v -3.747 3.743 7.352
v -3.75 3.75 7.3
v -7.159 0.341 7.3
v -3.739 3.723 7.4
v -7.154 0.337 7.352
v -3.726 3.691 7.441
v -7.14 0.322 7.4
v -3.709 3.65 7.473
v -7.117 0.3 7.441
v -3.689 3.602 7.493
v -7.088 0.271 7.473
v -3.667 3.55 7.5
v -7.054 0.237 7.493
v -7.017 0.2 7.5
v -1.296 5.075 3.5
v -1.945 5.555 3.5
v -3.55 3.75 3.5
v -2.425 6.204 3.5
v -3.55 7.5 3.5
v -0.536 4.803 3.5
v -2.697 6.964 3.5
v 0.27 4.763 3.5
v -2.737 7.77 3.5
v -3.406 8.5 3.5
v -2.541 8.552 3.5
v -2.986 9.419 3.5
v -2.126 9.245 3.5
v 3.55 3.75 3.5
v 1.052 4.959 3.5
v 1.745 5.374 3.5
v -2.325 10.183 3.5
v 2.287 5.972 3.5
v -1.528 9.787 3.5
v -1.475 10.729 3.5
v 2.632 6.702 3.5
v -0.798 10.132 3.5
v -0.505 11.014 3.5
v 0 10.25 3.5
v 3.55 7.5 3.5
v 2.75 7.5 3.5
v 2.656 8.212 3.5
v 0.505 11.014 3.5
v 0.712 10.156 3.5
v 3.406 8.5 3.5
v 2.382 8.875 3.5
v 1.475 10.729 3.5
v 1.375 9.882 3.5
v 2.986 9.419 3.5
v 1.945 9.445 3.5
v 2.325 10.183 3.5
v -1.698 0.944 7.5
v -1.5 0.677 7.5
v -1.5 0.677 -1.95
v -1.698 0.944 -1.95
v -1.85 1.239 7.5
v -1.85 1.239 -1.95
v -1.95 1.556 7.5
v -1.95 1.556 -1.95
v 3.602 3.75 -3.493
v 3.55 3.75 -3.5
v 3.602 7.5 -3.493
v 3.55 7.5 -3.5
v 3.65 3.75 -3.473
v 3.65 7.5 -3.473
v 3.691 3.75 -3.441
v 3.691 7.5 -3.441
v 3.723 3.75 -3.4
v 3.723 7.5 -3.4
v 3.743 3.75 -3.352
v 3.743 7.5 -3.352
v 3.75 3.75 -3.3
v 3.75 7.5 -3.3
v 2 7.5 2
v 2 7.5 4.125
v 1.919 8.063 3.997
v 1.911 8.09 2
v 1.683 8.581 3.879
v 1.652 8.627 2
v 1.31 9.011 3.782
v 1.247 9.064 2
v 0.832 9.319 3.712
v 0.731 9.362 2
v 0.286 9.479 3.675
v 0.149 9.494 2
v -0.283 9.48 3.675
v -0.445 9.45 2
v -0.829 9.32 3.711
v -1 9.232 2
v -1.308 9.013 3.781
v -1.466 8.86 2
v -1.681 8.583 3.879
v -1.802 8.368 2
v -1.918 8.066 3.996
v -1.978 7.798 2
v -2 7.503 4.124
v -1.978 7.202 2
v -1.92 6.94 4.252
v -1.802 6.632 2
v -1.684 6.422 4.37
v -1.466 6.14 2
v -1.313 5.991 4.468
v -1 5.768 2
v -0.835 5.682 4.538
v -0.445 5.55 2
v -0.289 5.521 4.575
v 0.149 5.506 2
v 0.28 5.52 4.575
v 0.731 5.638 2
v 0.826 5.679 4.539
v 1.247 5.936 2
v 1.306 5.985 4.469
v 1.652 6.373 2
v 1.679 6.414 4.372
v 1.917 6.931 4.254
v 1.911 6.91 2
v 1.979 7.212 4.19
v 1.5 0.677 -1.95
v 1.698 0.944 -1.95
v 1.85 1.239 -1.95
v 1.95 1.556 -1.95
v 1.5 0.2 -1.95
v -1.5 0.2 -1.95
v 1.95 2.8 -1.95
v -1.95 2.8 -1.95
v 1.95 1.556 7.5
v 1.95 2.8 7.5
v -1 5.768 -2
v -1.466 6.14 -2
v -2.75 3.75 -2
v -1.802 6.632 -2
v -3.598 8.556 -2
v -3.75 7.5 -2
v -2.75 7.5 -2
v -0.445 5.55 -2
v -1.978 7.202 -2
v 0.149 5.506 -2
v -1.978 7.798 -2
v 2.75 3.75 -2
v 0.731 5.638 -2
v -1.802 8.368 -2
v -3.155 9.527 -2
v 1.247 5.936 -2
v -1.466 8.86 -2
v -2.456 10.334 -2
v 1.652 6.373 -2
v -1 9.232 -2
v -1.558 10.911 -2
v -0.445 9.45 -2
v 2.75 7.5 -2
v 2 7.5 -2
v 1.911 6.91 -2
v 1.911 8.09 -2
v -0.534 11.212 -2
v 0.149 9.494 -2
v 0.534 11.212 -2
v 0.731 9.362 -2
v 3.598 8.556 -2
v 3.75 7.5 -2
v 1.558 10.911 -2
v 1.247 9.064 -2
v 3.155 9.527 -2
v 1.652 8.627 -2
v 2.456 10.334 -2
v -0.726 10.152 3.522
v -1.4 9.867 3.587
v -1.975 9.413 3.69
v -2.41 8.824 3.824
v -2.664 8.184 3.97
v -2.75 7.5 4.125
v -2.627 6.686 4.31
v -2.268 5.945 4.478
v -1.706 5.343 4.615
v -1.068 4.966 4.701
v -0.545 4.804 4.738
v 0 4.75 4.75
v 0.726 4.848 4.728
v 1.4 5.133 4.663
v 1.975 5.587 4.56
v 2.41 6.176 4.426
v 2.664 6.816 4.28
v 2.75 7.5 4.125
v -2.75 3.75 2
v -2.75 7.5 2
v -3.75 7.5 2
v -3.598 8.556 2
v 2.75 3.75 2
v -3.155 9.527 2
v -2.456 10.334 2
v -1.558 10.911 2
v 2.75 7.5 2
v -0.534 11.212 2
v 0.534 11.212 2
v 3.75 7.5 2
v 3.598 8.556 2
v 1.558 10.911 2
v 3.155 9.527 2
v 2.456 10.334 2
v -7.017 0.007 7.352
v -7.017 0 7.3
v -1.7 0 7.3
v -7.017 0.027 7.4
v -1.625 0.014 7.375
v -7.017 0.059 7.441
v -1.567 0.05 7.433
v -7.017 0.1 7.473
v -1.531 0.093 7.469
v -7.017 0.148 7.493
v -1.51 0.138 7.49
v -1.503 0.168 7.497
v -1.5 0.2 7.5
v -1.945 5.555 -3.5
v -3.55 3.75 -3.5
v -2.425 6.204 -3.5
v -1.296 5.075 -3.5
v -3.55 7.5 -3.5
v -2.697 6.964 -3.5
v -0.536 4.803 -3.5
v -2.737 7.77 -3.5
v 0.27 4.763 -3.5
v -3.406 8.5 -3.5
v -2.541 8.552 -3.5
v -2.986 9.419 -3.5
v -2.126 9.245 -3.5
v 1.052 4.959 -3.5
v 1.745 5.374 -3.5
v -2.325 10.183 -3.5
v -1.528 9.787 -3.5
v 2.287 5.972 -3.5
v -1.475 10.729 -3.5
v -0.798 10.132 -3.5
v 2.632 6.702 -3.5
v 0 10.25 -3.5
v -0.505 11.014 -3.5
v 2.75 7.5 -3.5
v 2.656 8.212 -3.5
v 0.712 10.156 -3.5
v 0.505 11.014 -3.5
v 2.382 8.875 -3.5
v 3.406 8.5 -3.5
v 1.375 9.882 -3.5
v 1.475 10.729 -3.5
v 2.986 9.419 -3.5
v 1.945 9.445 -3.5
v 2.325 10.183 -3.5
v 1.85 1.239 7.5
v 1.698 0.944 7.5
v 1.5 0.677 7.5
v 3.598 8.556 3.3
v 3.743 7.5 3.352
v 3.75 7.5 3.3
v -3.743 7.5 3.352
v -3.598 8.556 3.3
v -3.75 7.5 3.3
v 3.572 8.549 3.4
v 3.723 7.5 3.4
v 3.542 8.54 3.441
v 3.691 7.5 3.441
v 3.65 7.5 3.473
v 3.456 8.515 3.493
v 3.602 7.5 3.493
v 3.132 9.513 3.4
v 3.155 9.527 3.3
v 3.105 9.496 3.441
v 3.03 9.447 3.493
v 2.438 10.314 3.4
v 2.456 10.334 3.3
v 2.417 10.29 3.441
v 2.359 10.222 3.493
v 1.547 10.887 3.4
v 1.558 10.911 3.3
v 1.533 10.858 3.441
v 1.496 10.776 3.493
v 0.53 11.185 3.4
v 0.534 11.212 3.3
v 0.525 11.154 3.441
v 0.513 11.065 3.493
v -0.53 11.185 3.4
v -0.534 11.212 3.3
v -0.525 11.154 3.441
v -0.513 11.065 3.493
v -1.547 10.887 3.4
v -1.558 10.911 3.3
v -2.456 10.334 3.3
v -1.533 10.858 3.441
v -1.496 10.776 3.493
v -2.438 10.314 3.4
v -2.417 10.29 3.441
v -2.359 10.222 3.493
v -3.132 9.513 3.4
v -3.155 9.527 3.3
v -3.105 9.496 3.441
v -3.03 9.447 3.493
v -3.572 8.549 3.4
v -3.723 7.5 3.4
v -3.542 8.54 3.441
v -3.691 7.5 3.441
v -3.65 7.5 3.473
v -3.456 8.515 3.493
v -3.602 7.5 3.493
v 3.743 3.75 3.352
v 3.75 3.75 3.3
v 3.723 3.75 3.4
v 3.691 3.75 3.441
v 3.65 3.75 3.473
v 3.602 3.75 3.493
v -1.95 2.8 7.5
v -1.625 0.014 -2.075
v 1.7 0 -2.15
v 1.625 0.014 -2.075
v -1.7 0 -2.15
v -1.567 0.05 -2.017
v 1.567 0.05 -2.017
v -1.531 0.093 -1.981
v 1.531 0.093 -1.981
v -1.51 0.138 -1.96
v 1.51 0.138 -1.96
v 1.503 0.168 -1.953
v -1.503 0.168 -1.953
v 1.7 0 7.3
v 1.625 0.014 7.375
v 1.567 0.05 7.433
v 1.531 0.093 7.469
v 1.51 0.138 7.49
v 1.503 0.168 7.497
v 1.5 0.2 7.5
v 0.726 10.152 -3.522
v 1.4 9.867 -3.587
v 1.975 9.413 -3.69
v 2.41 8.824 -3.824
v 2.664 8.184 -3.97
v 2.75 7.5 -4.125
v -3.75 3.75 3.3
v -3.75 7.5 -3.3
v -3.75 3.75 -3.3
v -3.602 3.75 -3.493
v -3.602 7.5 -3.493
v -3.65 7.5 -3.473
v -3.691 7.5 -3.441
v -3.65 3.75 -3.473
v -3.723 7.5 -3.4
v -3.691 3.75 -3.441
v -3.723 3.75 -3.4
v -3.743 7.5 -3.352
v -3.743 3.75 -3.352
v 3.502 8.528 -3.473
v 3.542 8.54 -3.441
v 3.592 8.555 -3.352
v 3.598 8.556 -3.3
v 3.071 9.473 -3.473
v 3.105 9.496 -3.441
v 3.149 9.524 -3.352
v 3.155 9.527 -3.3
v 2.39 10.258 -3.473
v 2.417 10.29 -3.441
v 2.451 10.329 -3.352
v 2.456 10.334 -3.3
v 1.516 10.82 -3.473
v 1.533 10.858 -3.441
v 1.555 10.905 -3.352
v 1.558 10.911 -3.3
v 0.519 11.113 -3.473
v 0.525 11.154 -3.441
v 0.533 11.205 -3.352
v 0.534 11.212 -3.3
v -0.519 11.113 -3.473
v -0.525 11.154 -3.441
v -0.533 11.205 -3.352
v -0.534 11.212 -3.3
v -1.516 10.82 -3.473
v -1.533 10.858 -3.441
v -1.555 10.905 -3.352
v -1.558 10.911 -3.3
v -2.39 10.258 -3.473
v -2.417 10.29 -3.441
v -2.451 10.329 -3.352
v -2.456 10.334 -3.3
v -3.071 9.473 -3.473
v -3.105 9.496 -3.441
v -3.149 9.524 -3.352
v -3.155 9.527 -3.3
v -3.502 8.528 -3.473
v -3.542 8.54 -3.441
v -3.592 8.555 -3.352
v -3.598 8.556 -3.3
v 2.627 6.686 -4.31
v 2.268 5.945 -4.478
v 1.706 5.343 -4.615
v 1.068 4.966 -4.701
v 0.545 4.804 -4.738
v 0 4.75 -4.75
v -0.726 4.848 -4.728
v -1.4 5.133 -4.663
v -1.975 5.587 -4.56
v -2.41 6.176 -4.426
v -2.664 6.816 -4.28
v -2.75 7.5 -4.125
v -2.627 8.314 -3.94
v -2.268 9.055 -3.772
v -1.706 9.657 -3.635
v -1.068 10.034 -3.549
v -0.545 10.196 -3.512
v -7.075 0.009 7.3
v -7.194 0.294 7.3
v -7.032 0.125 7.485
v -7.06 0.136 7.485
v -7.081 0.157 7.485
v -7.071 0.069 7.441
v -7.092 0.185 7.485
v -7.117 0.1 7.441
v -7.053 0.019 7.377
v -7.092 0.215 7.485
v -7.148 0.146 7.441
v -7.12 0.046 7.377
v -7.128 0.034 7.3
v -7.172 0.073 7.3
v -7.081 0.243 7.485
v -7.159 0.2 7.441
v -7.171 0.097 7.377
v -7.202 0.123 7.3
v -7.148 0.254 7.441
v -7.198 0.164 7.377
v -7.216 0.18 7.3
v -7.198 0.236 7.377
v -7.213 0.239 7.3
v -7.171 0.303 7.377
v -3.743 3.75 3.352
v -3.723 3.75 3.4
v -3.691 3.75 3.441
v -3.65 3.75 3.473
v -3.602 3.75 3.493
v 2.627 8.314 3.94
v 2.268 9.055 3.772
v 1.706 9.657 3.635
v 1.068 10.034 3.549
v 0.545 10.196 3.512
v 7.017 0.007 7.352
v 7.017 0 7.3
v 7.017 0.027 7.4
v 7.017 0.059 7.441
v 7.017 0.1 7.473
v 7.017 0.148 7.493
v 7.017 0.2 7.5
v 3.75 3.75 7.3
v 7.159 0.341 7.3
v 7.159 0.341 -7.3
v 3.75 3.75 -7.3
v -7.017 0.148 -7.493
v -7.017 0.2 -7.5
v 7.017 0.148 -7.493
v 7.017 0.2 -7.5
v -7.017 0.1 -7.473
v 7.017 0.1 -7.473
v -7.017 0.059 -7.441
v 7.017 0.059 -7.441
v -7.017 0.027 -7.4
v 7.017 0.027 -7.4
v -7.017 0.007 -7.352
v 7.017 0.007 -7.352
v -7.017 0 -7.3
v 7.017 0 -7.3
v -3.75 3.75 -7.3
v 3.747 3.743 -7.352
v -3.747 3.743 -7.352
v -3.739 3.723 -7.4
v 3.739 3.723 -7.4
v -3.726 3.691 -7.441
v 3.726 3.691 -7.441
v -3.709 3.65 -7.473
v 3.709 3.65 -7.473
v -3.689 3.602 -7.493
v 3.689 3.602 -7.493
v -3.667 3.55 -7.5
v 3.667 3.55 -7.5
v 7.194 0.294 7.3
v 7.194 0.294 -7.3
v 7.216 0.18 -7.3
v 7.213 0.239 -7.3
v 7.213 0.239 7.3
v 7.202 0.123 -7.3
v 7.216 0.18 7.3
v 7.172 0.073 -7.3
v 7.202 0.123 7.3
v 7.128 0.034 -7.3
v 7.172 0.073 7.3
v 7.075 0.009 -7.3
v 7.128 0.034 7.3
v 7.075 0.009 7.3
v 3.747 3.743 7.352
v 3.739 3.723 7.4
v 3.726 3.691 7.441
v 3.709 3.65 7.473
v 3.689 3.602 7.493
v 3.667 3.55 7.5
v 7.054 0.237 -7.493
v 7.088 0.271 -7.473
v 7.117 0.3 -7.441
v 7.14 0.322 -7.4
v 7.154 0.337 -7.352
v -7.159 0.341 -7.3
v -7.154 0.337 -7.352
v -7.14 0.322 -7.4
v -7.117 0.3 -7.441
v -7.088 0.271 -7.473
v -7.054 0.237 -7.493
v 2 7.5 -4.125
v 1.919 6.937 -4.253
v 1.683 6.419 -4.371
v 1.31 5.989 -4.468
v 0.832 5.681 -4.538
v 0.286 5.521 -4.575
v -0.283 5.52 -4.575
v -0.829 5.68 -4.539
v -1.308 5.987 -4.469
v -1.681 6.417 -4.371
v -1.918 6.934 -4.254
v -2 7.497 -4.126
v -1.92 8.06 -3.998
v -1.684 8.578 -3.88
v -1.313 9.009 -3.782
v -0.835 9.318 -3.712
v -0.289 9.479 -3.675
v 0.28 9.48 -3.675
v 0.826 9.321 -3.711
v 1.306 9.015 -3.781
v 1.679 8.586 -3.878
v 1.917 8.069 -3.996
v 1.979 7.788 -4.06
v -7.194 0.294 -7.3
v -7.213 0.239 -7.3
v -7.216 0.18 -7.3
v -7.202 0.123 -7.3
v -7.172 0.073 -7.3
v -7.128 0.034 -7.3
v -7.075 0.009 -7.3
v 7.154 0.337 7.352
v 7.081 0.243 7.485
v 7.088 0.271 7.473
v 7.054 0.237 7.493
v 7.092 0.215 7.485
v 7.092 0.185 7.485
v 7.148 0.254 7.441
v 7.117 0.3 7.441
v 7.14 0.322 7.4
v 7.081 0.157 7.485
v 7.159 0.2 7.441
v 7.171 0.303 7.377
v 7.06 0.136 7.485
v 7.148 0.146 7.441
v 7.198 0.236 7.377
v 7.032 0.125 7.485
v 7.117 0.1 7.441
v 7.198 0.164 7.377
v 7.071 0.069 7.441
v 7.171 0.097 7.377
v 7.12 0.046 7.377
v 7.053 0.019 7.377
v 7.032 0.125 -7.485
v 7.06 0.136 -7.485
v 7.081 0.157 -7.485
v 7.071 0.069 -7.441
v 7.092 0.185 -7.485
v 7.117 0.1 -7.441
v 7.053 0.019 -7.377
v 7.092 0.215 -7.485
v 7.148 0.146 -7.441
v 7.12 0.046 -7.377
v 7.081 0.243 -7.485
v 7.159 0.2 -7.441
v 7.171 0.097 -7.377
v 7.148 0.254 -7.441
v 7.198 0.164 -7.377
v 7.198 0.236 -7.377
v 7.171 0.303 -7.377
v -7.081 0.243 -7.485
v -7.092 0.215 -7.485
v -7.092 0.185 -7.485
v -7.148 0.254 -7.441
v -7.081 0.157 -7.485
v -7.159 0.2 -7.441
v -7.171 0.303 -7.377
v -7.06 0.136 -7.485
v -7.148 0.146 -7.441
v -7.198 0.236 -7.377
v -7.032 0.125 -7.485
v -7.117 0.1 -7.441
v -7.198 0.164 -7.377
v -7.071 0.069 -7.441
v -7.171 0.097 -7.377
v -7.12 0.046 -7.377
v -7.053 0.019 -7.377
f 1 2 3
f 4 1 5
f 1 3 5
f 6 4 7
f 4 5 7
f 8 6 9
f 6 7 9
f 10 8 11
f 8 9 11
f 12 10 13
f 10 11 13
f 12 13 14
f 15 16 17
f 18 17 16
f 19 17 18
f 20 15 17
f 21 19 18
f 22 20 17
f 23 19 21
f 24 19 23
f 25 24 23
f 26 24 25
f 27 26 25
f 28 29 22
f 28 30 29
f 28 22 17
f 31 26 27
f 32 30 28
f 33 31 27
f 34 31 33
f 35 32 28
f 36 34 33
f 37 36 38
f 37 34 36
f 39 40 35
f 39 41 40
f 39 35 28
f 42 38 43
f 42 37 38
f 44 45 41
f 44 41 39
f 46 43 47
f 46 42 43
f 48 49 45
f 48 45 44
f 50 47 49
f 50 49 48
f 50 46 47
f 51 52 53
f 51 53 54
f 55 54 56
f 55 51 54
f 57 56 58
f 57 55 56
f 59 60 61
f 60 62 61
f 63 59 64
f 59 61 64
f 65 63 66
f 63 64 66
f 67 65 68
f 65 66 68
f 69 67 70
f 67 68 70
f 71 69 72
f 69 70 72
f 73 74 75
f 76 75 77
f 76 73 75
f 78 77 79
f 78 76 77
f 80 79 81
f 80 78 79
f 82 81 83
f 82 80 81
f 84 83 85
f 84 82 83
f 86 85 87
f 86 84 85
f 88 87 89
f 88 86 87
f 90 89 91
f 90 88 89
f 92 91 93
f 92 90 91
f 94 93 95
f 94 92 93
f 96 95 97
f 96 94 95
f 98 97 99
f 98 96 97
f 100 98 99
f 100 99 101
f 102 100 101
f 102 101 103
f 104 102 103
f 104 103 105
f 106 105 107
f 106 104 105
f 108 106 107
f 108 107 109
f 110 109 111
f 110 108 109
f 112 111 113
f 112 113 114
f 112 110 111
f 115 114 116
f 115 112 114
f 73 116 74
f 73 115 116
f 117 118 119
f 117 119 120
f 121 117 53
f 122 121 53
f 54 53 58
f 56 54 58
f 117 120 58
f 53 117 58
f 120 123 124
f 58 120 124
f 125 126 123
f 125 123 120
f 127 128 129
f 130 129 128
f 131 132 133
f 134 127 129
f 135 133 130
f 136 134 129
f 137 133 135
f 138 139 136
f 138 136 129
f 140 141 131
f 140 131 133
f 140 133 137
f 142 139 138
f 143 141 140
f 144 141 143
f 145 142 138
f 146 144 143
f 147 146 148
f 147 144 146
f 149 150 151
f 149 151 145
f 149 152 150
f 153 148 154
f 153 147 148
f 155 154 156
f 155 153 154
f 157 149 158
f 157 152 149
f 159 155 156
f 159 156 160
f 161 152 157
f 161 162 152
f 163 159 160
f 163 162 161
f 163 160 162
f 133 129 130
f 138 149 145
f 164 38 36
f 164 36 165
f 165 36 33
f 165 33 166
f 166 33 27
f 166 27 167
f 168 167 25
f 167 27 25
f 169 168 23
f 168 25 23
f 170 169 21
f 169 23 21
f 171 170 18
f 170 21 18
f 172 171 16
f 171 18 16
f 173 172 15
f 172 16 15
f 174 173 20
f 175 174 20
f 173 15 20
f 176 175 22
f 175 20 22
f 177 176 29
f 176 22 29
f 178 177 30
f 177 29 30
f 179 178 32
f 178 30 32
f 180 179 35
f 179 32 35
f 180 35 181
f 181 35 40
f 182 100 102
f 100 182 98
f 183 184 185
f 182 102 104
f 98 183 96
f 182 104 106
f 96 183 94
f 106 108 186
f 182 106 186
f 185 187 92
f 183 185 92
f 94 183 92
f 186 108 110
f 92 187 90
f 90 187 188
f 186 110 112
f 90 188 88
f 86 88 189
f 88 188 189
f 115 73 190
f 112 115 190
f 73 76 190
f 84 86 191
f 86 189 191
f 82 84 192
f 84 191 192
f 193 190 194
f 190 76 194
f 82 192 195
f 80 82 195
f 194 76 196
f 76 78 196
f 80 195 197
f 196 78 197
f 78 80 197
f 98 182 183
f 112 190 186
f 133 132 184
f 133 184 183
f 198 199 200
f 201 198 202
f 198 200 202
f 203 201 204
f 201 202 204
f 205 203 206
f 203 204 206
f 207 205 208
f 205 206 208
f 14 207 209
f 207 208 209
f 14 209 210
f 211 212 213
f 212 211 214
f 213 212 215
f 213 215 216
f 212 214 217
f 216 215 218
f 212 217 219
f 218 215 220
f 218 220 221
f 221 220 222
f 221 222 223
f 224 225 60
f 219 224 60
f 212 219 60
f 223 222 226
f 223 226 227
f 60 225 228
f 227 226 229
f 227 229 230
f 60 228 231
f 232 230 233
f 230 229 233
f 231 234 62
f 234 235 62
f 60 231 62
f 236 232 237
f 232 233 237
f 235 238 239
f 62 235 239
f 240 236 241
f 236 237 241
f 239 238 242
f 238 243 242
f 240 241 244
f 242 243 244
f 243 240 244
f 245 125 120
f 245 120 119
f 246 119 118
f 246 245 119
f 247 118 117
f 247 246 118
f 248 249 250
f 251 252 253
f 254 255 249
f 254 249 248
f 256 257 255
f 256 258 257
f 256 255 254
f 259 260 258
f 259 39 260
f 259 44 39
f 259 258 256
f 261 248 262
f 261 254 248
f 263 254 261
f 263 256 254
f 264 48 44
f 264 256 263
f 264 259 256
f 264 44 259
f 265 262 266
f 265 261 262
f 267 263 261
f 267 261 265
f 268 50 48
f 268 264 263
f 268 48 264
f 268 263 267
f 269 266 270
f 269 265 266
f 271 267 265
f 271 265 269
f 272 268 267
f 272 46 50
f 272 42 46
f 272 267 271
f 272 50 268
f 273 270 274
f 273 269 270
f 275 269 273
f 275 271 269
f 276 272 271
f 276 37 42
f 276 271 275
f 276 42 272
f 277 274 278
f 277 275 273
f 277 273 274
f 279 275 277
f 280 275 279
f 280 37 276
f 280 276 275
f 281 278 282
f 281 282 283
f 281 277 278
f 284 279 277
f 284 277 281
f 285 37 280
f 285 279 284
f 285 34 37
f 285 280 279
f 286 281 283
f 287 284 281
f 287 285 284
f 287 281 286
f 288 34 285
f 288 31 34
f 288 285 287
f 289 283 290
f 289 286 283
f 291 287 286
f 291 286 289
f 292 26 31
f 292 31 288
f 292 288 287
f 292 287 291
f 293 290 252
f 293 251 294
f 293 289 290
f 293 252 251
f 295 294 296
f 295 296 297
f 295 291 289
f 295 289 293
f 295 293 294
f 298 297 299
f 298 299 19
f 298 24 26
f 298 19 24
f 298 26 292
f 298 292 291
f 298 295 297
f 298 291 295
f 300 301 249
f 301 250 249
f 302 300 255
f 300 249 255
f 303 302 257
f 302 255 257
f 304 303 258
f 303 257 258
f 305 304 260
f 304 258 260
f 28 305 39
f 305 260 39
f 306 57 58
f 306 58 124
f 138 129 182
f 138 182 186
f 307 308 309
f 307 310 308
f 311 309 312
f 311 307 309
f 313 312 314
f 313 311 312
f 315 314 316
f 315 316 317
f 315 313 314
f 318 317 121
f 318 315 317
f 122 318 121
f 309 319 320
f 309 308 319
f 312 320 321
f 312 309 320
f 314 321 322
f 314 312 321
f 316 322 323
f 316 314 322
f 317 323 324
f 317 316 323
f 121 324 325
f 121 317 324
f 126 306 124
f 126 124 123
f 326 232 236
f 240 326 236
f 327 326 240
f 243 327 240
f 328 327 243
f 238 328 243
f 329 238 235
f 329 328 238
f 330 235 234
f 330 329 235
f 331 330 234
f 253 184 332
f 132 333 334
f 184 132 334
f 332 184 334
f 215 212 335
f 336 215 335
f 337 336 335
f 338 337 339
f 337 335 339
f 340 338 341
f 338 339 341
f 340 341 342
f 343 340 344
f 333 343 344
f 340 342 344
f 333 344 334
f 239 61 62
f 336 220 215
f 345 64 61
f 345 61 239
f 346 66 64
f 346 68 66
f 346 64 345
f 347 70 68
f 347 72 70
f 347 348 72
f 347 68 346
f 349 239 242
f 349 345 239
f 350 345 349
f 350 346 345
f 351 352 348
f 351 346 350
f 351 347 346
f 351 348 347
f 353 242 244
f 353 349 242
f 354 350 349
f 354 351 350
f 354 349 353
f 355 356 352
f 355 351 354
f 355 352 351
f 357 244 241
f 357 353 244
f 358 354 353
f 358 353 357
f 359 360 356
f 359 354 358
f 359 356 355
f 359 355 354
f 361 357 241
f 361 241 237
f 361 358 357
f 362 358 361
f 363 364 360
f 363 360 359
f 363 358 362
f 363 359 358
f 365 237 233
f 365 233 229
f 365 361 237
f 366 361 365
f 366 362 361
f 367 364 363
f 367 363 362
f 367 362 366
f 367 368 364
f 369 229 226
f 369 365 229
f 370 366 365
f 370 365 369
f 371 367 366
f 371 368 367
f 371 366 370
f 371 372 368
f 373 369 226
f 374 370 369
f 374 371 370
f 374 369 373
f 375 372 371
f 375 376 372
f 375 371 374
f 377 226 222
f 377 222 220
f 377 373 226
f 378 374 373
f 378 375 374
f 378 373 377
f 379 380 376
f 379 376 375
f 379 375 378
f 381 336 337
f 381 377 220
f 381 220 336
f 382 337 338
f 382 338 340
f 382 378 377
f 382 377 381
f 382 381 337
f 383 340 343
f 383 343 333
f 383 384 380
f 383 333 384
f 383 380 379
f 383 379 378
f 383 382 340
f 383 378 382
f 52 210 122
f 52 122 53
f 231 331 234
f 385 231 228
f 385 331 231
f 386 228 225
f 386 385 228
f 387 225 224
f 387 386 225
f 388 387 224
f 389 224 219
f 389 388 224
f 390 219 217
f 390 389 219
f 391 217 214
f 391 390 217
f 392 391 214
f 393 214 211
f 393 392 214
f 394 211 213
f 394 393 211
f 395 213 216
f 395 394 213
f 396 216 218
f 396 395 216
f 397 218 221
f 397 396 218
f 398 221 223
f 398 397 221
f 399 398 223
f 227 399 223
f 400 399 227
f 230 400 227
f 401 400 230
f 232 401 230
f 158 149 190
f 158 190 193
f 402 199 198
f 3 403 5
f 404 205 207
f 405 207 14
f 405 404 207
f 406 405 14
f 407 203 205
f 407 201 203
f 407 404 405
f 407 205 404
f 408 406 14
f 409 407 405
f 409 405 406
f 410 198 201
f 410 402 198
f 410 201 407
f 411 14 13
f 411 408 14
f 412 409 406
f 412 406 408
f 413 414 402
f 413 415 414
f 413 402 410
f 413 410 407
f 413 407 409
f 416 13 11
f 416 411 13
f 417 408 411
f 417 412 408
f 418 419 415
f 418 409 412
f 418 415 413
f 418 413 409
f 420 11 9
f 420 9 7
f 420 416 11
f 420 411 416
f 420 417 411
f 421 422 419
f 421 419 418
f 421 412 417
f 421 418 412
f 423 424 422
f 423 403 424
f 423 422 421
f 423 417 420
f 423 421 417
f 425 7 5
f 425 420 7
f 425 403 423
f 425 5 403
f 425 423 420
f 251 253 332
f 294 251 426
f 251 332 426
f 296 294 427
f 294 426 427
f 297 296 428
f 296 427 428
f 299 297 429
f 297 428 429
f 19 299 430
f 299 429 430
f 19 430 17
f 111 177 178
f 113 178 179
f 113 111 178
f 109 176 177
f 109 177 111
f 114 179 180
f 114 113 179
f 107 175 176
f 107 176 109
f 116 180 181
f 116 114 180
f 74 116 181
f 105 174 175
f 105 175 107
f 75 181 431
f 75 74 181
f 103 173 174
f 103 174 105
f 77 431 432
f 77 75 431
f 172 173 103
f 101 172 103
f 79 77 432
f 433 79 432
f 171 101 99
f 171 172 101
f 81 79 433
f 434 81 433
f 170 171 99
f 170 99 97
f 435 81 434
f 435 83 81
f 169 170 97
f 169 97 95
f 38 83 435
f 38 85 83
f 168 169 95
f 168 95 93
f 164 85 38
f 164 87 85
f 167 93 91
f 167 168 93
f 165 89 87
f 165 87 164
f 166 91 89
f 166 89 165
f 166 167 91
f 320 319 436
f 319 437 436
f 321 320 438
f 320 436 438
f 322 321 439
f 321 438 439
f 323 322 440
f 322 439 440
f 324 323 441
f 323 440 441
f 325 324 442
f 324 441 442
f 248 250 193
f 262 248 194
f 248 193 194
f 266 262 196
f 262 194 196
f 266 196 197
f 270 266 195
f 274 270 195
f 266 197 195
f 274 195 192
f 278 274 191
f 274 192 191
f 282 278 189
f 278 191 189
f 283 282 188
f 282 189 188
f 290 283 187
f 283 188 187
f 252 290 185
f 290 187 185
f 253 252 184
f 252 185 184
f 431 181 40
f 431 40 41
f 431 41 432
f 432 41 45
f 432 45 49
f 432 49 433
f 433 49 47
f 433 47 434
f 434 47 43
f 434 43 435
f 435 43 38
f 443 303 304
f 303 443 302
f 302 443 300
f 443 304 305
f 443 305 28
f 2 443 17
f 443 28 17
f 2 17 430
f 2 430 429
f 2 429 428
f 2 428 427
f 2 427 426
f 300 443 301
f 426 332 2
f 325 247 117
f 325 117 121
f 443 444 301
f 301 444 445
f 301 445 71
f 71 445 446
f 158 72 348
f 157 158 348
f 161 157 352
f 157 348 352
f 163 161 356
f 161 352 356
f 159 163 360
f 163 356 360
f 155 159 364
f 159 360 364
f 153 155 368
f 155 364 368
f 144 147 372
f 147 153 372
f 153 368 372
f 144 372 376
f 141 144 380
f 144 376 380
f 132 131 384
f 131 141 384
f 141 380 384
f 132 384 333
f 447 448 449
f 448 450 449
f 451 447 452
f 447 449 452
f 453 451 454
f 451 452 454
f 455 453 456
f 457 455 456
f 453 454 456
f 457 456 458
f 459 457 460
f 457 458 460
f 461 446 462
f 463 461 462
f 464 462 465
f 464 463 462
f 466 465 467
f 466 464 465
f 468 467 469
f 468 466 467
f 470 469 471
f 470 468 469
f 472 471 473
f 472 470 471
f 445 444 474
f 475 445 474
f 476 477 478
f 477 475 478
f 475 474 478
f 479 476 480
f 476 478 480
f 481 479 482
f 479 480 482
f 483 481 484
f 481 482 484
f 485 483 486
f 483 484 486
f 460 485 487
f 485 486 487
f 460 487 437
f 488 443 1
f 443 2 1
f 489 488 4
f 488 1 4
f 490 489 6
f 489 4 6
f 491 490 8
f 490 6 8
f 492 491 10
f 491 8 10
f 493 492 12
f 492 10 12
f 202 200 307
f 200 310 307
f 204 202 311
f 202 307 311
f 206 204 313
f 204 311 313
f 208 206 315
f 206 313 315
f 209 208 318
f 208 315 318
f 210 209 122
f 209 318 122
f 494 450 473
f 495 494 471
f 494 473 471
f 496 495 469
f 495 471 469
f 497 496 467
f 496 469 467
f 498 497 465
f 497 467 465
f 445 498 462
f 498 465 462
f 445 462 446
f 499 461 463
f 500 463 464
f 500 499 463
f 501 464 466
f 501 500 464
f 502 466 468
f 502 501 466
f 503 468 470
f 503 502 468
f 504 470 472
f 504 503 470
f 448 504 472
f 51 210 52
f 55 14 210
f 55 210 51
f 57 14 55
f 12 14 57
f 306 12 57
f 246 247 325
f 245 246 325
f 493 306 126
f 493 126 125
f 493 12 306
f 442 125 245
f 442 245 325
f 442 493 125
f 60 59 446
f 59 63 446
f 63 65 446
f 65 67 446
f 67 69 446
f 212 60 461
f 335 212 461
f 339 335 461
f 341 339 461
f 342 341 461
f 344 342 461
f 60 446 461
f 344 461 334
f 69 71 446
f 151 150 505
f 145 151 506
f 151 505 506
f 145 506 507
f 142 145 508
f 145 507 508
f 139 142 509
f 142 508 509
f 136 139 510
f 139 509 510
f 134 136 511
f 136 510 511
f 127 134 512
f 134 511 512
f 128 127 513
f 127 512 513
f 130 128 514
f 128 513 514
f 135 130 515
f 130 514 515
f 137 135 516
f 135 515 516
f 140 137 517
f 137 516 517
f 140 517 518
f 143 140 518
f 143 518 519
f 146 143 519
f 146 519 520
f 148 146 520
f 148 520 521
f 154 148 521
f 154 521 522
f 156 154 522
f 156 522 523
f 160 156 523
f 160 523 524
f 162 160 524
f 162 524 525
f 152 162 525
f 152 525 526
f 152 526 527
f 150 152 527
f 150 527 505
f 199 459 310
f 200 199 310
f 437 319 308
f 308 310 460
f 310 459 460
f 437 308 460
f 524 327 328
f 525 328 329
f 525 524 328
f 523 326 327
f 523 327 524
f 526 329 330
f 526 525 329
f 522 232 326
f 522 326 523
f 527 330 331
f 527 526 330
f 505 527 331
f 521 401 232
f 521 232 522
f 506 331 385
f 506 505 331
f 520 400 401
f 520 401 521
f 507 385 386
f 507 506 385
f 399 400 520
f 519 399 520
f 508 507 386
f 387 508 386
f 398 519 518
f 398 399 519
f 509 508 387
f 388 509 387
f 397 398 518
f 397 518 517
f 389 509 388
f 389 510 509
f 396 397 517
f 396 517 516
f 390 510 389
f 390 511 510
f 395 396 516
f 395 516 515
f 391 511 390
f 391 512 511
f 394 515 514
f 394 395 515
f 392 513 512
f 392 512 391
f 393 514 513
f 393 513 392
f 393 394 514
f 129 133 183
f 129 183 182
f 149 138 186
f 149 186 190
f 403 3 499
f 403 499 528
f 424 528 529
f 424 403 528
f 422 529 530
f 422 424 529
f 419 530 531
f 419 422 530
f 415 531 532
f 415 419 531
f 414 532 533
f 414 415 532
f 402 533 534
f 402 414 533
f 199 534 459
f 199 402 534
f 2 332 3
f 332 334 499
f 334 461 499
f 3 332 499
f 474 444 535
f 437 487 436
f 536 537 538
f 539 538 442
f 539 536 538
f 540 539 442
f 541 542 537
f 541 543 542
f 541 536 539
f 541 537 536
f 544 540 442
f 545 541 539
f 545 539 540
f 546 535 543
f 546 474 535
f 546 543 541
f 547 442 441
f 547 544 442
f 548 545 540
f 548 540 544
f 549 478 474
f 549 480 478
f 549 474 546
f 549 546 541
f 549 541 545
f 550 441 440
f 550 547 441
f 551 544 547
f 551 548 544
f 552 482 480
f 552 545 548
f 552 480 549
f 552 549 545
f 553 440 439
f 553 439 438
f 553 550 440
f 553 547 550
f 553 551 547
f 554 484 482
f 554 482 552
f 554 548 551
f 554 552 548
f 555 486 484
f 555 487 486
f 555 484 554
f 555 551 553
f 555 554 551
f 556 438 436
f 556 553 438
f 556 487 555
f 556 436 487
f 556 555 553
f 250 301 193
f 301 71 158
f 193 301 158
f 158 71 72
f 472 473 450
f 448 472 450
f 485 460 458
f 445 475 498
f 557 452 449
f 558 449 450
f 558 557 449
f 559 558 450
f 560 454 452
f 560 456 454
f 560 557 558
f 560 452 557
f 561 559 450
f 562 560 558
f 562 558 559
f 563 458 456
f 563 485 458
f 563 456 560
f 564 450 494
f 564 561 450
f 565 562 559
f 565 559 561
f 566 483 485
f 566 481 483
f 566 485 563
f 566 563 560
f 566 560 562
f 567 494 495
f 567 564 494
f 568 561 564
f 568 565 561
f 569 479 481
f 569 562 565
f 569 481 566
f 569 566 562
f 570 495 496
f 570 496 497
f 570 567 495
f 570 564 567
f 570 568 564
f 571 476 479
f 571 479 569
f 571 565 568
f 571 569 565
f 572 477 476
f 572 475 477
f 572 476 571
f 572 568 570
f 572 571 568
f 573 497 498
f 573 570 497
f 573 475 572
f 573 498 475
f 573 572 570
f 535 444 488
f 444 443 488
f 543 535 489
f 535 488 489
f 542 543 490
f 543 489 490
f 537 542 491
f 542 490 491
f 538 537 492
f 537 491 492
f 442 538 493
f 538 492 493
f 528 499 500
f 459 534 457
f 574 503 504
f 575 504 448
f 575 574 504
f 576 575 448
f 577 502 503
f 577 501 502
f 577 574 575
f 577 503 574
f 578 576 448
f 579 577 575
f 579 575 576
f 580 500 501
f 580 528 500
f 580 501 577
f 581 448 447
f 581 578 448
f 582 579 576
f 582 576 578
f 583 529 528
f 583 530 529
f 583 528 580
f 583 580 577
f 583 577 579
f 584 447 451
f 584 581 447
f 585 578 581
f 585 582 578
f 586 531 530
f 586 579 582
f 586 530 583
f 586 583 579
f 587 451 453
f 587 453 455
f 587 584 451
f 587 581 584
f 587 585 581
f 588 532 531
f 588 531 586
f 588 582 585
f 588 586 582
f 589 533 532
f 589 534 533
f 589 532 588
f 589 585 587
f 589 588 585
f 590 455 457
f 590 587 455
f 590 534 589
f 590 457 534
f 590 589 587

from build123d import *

# Parameters (mm, degrees)
EXTRUDE_1_DEPTH          = 3.5
EXTRUDE_1_DEPTH_BACK     = 3.5
SKETCH_1_R               = 2
EXTRUDE_2_DEPTH          = 7.5
EXTRUDE_2_DEPTH_BACK     = 7.5
CUT_EXTRUDE_1_DEPTH      = 2
CUT_EXTRUDE_1_DEPTH_BACK = 2
SKETCH_4_R               = 2.75
SKETCH_4_R_2             = 2
EXTRUDE_3_DEPTH          = 1.25
EXTRUDE_START            = 1.25
SKETCH_5_R               = 2.75
SKETCH_5_R_2             = 2
EXTRUDE_4_DEPTH          = 1.25
CUT_EXTRUDE_START        = -2.7500001
CUT_EXTRUDE_2_DEPTH      = 5.5000001
CUT_EXTRUDE_3_DEPTH      = 9.45
FILLET_1_R               = 0.2
FILLET_2_R               = 0.2


# Read off the part's stored shape, not the designer's step: 切除-拉伸2
with BuildPart() as part:
    # 草图1 → 凸台-拉伸1 (new, two sides: drawn at the far end of the back side and taken through both)
    with BuildSketch(Plane.XY.offset(-EXTRUDE_1_DEPTH_BACK)):
        with BuildLine():
            Line((-3.75, 7.5), (-3.75, 3.75))
            Line((-3.75, 3.75), (3.75, 3.75))
            Line((3.75, 3.75), (3.75, 7.5))
            ThreePointArc((3.75, 7.5), (0, 11.25), (-3.75, 7.5))
        make_face()
        with Locations((0, 7.5)):
            Circle(SKETCH_1_R, mode=Mode.SUBTRACT)
    extrude(amount=EXTRUDE_1_DEPTH + EXTRUDE_1_DEPTH_BACK)

    # 草图2 → 凸台-拉伸2 (add, two sides: drawn at the far end of the back side and taken through both)
    with BuildSketch(Plane.XY.offset(-EXTRUDE_2_DEPTH_BACK)):
        Polygon((-7.5, 0), (7.5, 0), (3.75, 3.75), (-3.75, 3.75), align=None)
    extrude(amount=EXTRUDE_2_DEPTH + EXTRUDE_2_DEPTH_BACK)

    # 草图3 → 切除-拉伸1 (cut, two sides: drawn at the far end of the back side and taken through both)
    with BuildSketch(Plane.XY.offset(-CUT_EXTRUDE_1_DEPTH_BACK)):
        Polygon((-2.75, 3.75), (2.75, 3.75), (2.75, 7.5), (3.75, 7.5), (3.75, 11.38728412), (-3.75, 11.38728412), (-3.75, 7.5), (-2.75, 7.5), align=None)
    extrude(amount=CUT_EXTRUDE_1_DEPTH + CUT_EXTRUDE_1_DEPTH_BACK, mode=Mode.SUBTRACT)

    # 草图4 → 凸台-拉伸3 (add)
    with BuildSketch(Plane.XY.offset(3.5)):
        with Locations((0, 7.5)):
            Circle(SKETCH_4_R)
        with Locations((0, 7.5)):
            Circle(SKETCH_4_R_2, mode=Mode.SUBTRACT)
    extrude(amount=EXTRUDE_3_DEPTH)

    # 草图5 → 凸台-拉伸4 (add)
    with BuildSketch(Plane(origin=(0, 0, -3.5), x_dir=(-1, 0, 0), z_dir=(0, 0, -1)).offset(EXTRUDE_START)):
        with Locations(Location((0, 7.5, 0), (0, 0, 180))):
            Circle(SKETCH_5_R)
        with Locations(Location((0, 7.5, 0), (0, 0, 180))):
            Circle(SKETCH_5_R_2, mode=Mode.SUBTRACT)
    extrude(amount=-EXTRUDE_4_DEPTH)

    # 切除-拉伸2 outline → 切除-拉伸2 (cut)
    with BuildSketch(Plane(origin=(0, 0, 0), x_dir=(0, 0, -1), z_dir=(1, 0, 0)).offset(CUT_EXTRUDE_START)):
        Polygon((4.75, 10.25), (3.5, 10.25), (4.75, 4.75), align=None)
        Polygon((-4.75, 10.25), (-4.75, 4.75), (-3.5, 10.25), align=None)
    extrude(amount=CUT_EXTRUDE_2_DEPTH, mode=Mode.SUBTRACT)

    # 草图7 → 切除-拉伸3 (cut)
    with BuildSketch(Plane.XY.offset(7.5)):
        with BuildLine():
            Line((-1.5, 0), (-1.5, 0.677124344))
            ThreePointArc((-1.5, 0.677124344), (-1.780042303, 1.088161527), (-1.95, 1.555590279))
            Line((-1.95, 1.555590279), (-1.95, 2.8))
            Line((-1.95, 2.8), (1.95, 2.8))
            Line((1.95, 2.8), (1.95, 1.555590279))
            ThreePointArc((1.95, 1.555590279), (1.780042303, 1.088161527), (1.5, 0.677124344))
            Line((1.5, 0.677124344), (1.5, 0))
            Line((1.5, 0), (-1.5, 0))
        make_face()
    extrude(amount=-CUT_EXTRUDE_3_DEPTH, mode=Mode.SUBTRACT)

    # 圆角1
    fillet_1_edges = [part.edges().sort_by_distance(p)[0] for p in [
        (4.5, 0, 7.5),
        (7.5, 0, 0),
        (0, 0, -7.5),
        (-7.5, 0, 0),
        (-4.5, 0, 7.5),
        (-1.5, 0, 2.775),
        (0, 0, -1.95),
        (1.5, 0, 2.775),
        (5.625, 1.875, -7.5),
        (0, 3.75, -7.5),
        (-5.625, 1.875, -7.5),
        (0, 3.75, 7.5),
        (-5.625, 1.875, 7.5),
        (5.625, 1.875, 7.5),
    ]]
    fillet(fillet_1_edges, radius=FILLET_1_R)

    # 圆角2
    fillet_2_edges = [part.edges().sort_by_distance(p)[0] for p in [
        (-3.75, 5.625, -3.5),
        (3.75, 5.625, -3.5),
        (0, 11.25, -3.5),
        (-3.75, 5.625, 3.5),
        (3.75, 5.625, 3.5),
        (0, 11.25, 3.5),
    ]]
    fillet(fillet_2_edges, radius=FILLET_2_R)


solid = part.part
